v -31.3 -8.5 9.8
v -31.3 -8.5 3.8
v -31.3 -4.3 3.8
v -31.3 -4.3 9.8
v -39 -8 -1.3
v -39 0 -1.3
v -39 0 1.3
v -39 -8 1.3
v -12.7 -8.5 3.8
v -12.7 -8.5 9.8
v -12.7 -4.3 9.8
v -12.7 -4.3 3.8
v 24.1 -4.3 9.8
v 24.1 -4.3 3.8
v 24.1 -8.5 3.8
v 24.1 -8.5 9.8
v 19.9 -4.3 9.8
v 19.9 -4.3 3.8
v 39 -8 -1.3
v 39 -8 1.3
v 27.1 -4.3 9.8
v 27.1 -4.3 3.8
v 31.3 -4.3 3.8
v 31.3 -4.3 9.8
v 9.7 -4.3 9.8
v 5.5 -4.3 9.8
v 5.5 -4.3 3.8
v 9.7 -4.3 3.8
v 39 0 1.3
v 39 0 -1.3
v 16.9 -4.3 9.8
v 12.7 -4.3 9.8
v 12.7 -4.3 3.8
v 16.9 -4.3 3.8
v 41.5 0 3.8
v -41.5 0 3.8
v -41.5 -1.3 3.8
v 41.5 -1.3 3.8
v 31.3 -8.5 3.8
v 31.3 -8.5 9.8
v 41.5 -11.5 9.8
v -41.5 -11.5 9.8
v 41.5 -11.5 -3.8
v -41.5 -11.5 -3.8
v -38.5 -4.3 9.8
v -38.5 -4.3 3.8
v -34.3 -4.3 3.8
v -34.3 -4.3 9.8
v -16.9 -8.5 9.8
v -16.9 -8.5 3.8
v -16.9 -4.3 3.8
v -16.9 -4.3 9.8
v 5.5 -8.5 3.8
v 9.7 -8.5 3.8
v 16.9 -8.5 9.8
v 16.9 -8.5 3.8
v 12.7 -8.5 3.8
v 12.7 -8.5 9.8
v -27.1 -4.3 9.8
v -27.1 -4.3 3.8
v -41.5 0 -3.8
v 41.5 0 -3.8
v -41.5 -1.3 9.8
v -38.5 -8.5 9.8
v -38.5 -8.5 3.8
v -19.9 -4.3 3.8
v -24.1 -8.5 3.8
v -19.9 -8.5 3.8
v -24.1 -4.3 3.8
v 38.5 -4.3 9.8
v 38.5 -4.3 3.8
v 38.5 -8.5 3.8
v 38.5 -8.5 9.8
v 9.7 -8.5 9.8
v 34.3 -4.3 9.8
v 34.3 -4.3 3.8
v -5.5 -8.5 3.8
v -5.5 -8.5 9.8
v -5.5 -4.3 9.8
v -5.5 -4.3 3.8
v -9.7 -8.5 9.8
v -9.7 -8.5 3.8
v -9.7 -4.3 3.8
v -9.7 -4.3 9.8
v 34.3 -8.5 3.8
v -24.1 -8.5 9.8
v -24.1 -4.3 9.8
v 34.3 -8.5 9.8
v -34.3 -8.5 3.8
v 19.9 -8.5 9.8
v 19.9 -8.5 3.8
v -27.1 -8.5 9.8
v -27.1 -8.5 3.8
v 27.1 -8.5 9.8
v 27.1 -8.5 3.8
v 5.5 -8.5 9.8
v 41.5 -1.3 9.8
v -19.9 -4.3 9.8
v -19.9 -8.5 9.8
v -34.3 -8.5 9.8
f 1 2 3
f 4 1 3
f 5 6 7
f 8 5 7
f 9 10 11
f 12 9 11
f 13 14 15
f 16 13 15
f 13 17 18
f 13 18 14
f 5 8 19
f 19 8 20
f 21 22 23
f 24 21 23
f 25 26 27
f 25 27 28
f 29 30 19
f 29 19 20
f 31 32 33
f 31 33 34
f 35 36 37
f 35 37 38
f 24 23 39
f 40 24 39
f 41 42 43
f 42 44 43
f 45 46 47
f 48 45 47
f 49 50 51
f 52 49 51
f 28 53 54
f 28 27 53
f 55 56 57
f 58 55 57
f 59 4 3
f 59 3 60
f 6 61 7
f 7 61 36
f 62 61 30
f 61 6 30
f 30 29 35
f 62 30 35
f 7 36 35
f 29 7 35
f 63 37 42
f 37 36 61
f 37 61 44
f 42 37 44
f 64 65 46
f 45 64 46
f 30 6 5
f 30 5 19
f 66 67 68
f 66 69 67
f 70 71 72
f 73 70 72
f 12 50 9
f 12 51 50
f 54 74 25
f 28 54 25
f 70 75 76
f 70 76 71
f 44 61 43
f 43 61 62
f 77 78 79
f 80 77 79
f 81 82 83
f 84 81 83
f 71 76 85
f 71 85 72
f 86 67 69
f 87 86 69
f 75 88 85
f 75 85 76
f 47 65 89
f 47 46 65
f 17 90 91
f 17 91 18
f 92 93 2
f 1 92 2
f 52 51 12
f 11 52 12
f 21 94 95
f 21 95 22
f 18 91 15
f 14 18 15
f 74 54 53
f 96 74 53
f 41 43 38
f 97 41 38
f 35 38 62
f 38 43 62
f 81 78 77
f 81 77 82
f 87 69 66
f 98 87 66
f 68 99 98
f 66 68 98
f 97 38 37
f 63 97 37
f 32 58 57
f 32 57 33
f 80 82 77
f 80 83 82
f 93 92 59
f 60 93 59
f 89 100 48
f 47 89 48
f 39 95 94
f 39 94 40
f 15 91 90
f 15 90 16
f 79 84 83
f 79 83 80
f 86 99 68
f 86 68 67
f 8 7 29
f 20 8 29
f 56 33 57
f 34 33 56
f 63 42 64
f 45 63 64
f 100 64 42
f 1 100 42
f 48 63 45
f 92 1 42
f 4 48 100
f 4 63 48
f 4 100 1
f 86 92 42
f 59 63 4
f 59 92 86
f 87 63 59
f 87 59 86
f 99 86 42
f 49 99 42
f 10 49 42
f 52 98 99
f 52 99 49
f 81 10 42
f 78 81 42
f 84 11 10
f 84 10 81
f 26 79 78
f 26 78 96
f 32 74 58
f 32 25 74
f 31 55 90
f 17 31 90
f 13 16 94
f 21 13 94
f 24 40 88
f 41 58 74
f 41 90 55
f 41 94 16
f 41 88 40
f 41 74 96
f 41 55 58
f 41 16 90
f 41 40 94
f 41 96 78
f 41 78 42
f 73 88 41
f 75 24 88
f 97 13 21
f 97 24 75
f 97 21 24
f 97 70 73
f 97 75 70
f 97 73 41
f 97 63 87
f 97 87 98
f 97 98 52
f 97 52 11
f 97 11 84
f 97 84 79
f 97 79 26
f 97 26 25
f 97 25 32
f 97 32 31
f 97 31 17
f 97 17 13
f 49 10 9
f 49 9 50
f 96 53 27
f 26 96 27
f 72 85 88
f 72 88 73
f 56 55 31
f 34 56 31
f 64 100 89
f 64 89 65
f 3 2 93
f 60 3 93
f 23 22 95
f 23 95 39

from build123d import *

# Parameters (mm, degrees)
F0_W     = 83
F0_H     = 7.6
F0_W_2   = 78
F0_H_2   = 2.6
F1_DEPTH = 8
F2_W     = 83
F2_H     = 7.6
F2_W_2   = 78
F2_H_2   = 2.6
F3_DEPTH = 3.5
F4_W     = 3
F4_H     = 3
F4_W_2   = 4.2
F4_H_2   = 4.2
F4_W_3   = 11
F5_DEPTH = 6


with BuildPart() as f1:
    # F0 (on Front) → F1 (new body)
    with BuildSketch(Plane.XZ):
        Rectangle(F0_W, F0_H)
        Rectangle(F0_W_2, F0_H_2, mode=Mode.SUBTRACT)
    extrude(amount=F1_DEPTH)

    # F2 (on face) → F3 (join)
    with BuildSketch(Plane.XZ.offset(8)):
        Rectangle(F2_W, F2_H)
        Rectangle(F2_W_2, F2_H_2, mode=Mode.SUBTRACT)
        Rectangle(F2_W_2, F2_H_2)
    extrude(amount=F3_DEPTH)

    # F4 (on face) → F5 (join)
    with BuildSketch(Plane.XY.offset(3.8)):
        with Locations((-40, -10)):
            Rectangle(F4_W, F4_H)
        with Locations((-36.4, -10)):
            Rectangle(F4_W_2, F4_H)
        with Locations((-40, -6.4)):
            Rectangle(F4_W, F4_H_2)
        with Locations((-32.8, -10)):
            Rectangle(F4_W, F4_H)
        with Locations((-40, -2.8)):
            Rectangle(F4_W, F4_H)
        with Locations((-29.2, -10)):
            Rectangle(F4_W_2, F4_H)
        with Locations((-32.8, -6.4)):
            Rectangle(F4_W, F4_H_2)
        with Locations((-36.4, -2.8)):
            Rectangle(F4_W_2, F4_H)
        with Locations((-25.6, -10)):
            Rectangle(F4_W, F4_H)
        with Locations((-32.8, -2.8)):
            Rectangle(F4_W, F4_H)
        with Locations((-22, -10)):
            Rectangle(F4_W_2, F4_H)
        with Locations((-25.6, -6.4)):
            Rectangle(F4_W, F4_H_2)
        with Locations((-29.2, -2.8)):
            Rectangle(F4_W_2, F4_H)
        with Locations((-18.4, -10)):
            Rectangle(F4_W, F4_H)
        with Locations((-25.6, -2.8)):
            Rectangle(F4_W, F4_H)
        with Locations((40, -2.8)):
            Rectangle(F4_W, F4_H)
        with Locations((-14.8, -10)):
            Rectangle(F4_W_2, F4_H)
        with Locations((-18.4, -6.4)):
            Rectangle(F4_W, F4_H_2)
        with Locations((-22, -2.8)):
            Rectangle(F4_W_2, F4_H)
        with Locations((36.4, -2.8)):
            Rectangle(F4_W_2, F4_H)
        with Locations((40, -6.4)):
            Rectangle(F4_W, F4_H_2)
        with Locations((-11.2, -10)):
            Rectangle(F4_W, F4_H)
        with Locations((-18.4, -2.8)):
            Rectangle(F4_W, F4_H)
        with Locations((32.8, -2.8)):
            Rectangle(F4_W, F4_H)
        with Locations((40, -10)):
            Rectangle(F4_W, F4_H)
        with Locations((-7.6, -10)):
            Rectangle(F4_W_2, F4_H)
        with Locations((-11.2, -6.4)):
            Rectangle(F4_W, F4_H_2)
        with Locations((-14.8, -2.8)):
            Rectangle(F4_W_2, F4_H)
        with Locations((29.2, -2.8)):
            Rectangle(F4_W_2, F4_H)
        with Locations((32.8, -6.4)):
            Rectangle(F4_W, F4_H_2)
        with Locations((36.4, -10)):
            Rectangle(F4_W_2, F4_H)
        with Locations((0, -10)):
            Rectangle(F4_W_3, F4_H)
        with Locations((-11.2, -2.8)):
            Rectangle(F4_W, F4_H)
        with Locations((25.6, -2.8)):
            Rectangle(F4_W, F4_H)
        with Locations((32.8, -10)):
            Rectangle(F4_W, F4_H)
        with Locations((7.6, -10)):
            Rectangle(F4_W_2, F4_H)
        with Locations((0, -6.4)):
            Rectangle(F4_W_3, F4_H_2)
        with Locations((-7.6, -2.8)):
            Rectangle(F4_W_2, F4_H)
        with Locations((22, -2.8)):
            Rectangle(F4_W_2, F4_H)
        with Locations((25.6, -6.4)):
            Rectangle(F4_W, F4_H_2)
        with Locations((29.2, -10)):
            Rectangle(F4_W_2, F4_H)
        with Locations((11.2, -10)):
            Rectangle(F4_W, F4_H)
        with Locations((0, -2.8)):
            Rectangle(F4_W_3, F4_H)
        with Locations((18.4, -2.8)):
            Rectangle(F4_W, F4_H)
        with Locations((25.6, -10)):
            Rectangle(F4_W, F4_H)
        with Locations((14.8, -10)):
            Rectangle(F4_W_2, F4_H)
        with Locations((11.2, -6.4)):
            Rectangle(F4_W, F4_H_2)
        with Locations((7.6, -2.8)):
            Rectangle(F4_W_2, F4_H)
        with Locations((14.8, -2.8)):
            Rectangle(F4_W_2, F4_H)
        with Locations((18.4, -6.4)):
            Rectangle(F4_W, F4_H_2)
        with Locations((22, -10)):
            Rectangle(F4_W_2, F4_H)
        with Locations((18.4, -10)):
            Rectangle(F4_W, F4_H)
        with Locations((11.2, -2.8)):
            Rectangle(F4_W, F4_H)
    extrude(amount=F5_DEPTH)


solid = f1.part
